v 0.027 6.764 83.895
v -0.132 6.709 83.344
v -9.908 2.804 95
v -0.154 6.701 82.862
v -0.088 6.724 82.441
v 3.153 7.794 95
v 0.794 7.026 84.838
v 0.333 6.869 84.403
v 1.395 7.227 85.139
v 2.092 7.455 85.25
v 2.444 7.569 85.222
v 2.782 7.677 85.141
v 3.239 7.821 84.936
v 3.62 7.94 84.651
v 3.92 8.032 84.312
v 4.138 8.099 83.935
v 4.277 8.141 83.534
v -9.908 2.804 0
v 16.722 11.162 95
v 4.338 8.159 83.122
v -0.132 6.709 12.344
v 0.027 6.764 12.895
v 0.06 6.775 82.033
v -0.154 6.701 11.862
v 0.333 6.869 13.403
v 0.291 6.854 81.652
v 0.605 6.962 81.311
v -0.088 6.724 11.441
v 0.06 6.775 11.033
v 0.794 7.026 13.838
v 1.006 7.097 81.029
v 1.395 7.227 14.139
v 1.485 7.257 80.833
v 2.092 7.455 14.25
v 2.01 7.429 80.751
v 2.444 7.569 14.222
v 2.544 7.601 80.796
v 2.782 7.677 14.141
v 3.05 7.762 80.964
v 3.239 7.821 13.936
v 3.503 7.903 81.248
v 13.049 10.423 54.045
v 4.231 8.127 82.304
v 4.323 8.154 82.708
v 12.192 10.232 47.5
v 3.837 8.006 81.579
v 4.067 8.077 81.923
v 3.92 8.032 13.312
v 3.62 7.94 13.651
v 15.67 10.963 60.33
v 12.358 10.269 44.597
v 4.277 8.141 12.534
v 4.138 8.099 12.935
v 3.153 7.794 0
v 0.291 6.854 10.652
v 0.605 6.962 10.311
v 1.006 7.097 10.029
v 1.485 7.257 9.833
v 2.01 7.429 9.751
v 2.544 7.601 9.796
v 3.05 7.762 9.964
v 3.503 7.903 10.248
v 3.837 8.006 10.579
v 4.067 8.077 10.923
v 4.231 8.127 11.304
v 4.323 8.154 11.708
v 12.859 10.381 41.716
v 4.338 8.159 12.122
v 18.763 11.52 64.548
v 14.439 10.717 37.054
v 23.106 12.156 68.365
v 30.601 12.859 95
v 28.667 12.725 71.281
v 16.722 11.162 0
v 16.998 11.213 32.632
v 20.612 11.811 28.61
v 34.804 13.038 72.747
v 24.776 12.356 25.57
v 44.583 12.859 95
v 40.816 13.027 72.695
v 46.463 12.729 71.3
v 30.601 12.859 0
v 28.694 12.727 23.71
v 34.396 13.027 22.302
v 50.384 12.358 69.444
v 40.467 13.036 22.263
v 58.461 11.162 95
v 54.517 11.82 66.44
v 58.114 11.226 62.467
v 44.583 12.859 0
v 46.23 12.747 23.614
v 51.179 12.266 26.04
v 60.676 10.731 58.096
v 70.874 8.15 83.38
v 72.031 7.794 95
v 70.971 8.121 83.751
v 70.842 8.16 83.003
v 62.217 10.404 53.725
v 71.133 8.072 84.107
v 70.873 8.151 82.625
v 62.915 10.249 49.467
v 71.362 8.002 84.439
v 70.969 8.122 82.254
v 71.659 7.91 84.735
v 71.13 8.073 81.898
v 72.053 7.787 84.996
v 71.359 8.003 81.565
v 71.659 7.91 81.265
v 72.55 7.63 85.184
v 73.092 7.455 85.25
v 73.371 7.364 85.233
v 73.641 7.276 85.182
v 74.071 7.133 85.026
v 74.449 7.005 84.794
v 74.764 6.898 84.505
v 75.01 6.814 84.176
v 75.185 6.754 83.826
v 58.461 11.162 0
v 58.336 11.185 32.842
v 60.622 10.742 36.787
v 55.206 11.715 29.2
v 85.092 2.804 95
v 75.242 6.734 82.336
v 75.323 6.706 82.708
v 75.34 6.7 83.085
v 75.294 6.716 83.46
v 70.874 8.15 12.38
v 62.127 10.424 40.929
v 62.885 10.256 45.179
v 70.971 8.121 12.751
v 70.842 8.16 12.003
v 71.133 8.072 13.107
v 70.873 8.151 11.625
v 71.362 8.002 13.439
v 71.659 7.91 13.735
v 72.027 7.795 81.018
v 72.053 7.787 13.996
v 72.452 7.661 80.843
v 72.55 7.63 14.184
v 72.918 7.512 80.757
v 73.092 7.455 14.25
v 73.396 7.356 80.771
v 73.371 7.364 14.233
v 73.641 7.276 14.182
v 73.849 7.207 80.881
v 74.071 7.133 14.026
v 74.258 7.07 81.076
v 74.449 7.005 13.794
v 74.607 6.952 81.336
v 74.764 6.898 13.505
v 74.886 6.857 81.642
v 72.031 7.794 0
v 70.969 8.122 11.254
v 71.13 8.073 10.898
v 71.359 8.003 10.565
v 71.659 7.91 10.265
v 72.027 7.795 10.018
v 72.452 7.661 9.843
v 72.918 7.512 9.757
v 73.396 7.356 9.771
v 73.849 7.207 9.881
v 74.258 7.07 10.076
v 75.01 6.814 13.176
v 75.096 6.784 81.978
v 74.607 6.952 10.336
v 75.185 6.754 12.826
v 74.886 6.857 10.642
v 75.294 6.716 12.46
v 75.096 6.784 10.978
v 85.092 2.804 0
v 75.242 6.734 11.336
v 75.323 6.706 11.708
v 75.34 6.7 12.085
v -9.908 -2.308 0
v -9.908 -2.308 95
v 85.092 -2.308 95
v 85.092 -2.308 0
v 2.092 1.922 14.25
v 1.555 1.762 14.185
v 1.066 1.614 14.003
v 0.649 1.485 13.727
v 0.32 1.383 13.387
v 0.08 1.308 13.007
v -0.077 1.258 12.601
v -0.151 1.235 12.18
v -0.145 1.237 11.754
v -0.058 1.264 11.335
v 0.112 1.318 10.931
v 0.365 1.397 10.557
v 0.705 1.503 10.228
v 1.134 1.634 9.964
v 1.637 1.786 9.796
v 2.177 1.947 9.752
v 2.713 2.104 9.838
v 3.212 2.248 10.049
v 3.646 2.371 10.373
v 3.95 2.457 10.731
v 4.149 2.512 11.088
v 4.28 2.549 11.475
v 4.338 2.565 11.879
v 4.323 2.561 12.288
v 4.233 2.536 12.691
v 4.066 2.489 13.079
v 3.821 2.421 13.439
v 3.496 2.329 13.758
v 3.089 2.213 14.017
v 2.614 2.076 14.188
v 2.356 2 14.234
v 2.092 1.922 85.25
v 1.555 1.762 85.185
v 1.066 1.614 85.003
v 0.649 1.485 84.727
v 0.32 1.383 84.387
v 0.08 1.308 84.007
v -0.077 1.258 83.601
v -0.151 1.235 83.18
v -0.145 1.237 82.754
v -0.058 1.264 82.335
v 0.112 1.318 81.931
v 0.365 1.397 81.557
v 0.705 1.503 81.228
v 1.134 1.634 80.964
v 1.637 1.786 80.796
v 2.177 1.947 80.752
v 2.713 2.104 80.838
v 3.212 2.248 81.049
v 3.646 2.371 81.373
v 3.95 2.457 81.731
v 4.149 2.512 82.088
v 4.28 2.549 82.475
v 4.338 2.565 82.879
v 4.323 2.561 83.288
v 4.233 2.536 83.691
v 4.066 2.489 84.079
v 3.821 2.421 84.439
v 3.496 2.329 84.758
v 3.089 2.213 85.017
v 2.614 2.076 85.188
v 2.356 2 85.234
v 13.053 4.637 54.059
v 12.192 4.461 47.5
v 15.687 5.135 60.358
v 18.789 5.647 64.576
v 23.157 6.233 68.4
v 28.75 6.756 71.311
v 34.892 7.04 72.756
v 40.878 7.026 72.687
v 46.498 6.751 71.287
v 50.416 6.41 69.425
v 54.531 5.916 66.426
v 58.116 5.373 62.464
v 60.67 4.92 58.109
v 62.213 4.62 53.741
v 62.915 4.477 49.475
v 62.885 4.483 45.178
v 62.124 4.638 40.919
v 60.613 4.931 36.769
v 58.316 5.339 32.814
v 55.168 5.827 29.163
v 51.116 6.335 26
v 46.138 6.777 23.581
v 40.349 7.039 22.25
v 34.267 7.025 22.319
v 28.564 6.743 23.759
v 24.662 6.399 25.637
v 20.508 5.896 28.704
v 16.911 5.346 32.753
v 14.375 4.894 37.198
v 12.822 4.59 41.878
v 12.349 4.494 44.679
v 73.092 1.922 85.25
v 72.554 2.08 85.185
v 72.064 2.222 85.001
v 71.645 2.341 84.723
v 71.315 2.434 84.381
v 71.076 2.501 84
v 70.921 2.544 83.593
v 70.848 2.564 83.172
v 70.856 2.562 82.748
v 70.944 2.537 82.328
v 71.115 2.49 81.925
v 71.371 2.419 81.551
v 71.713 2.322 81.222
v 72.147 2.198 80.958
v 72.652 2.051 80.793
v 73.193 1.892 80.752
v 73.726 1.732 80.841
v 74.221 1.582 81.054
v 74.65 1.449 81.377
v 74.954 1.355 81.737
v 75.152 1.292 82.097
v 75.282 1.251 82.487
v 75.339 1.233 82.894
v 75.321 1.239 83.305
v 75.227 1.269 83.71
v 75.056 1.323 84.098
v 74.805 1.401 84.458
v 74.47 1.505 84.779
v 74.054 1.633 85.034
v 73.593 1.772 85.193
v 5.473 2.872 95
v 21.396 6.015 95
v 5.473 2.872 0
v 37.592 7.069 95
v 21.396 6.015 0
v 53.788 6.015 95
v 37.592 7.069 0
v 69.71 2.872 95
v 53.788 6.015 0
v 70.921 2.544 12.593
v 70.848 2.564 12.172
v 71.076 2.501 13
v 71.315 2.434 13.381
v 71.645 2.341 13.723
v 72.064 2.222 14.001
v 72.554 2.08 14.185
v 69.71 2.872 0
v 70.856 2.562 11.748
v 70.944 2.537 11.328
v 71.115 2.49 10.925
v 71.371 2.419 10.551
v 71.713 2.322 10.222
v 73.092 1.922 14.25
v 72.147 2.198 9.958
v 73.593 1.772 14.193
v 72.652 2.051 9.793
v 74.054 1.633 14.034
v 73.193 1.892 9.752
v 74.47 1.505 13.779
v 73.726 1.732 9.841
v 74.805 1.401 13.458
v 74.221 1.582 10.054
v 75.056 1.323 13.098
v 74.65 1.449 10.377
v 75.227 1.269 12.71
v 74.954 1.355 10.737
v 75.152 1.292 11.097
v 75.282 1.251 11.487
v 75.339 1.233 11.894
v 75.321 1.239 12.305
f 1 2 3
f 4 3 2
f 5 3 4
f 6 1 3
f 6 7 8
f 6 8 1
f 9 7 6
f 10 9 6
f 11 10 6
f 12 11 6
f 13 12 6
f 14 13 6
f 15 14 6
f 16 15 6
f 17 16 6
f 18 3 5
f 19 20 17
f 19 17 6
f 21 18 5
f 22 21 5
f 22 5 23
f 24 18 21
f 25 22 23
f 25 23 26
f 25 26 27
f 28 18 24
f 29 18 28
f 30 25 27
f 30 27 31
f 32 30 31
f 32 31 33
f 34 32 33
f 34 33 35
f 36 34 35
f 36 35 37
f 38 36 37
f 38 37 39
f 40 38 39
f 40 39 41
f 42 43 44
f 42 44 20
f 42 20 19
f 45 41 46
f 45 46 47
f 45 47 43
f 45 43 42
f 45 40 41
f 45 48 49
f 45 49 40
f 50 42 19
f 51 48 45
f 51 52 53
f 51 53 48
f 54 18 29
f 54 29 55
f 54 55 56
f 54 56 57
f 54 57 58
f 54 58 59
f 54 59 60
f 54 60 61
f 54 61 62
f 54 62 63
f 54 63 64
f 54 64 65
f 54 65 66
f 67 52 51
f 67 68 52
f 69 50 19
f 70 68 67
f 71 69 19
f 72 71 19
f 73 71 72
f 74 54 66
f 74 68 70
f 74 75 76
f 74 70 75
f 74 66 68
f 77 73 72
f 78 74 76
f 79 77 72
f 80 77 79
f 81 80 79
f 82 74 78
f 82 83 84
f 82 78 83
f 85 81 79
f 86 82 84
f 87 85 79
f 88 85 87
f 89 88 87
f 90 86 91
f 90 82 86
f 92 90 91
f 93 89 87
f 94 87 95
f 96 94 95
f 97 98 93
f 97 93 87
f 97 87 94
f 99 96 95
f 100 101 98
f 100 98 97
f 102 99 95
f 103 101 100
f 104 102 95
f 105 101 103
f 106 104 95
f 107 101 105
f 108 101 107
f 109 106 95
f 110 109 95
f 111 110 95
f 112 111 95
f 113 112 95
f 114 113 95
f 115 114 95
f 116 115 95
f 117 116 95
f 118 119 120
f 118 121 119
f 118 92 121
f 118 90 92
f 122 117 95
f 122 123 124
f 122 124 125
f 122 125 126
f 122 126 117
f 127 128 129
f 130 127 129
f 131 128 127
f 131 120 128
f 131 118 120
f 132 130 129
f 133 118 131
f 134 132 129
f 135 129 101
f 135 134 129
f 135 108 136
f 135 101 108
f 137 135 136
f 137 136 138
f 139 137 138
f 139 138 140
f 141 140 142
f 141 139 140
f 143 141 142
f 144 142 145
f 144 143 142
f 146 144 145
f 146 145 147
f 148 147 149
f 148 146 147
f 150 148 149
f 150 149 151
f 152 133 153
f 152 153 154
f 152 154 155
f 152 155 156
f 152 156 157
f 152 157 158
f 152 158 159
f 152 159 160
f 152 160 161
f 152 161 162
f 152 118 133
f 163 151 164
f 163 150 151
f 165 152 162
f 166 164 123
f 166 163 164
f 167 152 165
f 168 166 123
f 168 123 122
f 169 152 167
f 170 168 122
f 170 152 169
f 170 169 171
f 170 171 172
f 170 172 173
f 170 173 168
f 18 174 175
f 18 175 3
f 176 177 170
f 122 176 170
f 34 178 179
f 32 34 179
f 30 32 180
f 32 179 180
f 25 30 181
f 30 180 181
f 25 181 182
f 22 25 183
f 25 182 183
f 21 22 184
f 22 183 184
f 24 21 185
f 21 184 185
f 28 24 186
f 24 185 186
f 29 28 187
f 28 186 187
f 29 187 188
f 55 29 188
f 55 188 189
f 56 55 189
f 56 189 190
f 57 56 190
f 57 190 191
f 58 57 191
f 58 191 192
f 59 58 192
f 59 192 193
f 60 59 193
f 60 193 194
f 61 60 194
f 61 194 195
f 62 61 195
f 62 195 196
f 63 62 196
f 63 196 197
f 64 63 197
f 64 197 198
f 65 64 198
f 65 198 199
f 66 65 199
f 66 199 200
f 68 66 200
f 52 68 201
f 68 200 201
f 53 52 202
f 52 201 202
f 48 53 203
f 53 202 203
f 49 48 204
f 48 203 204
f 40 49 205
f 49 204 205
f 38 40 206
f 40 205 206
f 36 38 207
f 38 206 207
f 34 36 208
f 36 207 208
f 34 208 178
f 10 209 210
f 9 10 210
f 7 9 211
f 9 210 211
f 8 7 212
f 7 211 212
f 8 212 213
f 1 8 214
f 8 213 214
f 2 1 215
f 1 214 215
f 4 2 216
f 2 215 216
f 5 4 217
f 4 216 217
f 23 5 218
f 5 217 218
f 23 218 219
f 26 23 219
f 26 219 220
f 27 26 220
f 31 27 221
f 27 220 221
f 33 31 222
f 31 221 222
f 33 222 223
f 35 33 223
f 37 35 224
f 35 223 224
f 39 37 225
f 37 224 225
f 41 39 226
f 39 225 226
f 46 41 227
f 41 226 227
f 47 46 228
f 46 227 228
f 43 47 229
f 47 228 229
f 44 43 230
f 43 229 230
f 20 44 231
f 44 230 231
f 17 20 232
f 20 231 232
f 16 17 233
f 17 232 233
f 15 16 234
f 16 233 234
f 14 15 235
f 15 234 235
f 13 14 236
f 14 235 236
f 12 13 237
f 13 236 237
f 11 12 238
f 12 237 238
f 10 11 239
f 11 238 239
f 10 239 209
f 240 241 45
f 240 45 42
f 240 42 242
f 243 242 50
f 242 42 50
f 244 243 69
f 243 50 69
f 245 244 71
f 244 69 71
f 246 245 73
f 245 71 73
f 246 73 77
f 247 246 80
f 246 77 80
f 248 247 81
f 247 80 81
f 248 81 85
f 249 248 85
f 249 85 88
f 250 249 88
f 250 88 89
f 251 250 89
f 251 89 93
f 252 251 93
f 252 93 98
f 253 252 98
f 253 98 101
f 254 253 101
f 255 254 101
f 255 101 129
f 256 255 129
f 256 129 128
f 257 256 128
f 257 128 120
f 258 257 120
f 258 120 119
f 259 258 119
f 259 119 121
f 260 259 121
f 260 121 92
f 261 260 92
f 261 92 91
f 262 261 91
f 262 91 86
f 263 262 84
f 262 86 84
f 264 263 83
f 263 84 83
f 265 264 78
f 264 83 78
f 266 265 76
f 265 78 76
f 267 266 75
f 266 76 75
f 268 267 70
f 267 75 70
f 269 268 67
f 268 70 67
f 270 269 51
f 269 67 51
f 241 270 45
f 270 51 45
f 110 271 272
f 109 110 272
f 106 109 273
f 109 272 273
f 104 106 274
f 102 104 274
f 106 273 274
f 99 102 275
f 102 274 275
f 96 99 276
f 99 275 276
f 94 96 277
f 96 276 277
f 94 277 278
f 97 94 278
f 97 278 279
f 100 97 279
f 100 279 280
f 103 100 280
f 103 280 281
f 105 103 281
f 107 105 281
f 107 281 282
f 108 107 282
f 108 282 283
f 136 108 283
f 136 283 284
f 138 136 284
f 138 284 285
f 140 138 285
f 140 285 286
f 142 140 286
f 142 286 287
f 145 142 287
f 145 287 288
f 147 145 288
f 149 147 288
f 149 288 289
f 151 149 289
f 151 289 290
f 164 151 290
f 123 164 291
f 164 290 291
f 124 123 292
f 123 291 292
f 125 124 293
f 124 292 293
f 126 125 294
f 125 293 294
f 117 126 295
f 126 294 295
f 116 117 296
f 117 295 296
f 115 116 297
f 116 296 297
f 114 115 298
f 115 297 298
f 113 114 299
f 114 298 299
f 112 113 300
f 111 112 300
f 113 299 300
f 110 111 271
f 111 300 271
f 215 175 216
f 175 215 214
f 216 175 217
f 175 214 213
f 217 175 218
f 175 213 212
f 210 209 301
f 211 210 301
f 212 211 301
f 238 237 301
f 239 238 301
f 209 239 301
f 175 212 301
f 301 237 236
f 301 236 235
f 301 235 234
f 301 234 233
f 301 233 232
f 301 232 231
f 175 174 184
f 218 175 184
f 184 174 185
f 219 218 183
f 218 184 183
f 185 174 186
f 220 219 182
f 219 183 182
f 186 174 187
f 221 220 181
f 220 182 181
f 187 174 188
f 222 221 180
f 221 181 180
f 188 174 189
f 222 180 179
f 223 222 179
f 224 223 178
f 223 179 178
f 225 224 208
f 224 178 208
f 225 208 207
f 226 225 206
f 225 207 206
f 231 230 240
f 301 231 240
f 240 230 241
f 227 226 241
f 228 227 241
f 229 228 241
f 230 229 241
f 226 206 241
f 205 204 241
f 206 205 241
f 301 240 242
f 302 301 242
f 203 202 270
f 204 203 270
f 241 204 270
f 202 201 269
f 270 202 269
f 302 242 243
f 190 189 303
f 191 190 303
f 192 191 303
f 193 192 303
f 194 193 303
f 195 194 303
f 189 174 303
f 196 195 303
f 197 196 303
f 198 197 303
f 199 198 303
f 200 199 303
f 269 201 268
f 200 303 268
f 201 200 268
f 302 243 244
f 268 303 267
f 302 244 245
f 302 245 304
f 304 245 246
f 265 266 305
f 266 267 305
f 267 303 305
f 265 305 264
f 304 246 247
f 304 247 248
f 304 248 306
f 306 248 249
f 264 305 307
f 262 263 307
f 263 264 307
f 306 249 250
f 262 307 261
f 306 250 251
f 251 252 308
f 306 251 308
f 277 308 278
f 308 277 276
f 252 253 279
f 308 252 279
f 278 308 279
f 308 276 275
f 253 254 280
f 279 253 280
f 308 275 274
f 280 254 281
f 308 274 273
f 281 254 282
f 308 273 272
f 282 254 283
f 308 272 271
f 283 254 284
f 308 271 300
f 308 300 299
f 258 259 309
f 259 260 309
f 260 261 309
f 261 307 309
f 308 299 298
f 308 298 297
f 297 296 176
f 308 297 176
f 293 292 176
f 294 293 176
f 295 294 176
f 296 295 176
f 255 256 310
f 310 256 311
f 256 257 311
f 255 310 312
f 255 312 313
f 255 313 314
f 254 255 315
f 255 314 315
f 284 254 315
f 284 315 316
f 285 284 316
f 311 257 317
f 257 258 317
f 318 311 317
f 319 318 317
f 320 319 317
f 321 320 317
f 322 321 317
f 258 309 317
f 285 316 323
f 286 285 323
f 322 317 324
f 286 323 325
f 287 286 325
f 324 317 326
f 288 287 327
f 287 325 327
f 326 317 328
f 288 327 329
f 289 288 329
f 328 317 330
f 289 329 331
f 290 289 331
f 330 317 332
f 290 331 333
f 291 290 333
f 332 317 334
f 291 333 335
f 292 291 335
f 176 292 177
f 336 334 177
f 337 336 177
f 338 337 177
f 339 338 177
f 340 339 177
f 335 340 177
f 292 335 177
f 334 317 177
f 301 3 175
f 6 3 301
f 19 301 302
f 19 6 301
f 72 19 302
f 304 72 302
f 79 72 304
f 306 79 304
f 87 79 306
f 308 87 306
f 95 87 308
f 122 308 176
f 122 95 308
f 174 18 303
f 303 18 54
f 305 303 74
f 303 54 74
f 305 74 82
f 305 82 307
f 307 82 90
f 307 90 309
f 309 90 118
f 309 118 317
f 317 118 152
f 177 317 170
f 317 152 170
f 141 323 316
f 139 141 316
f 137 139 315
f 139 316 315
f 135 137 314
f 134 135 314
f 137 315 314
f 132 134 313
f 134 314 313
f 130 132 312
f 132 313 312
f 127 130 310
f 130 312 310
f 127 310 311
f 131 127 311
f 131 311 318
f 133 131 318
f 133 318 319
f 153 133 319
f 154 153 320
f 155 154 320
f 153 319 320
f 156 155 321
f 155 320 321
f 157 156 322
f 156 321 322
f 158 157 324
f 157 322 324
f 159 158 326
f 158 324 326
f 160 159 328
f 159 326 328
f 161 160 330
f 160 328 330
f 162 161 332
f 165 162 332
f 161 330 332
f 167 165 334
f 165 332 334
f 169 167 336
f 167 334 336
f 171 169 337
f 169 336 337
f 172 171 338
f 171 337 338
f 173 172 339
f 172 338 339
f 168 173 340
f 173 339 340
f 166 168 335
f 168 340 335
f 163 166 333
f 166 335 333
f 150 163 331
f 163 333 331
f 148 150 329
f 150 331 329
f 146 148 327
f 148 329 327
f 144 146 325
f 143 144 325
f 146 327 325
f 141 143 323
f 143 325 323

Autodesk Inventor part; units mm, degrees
ref_plane "YZ Plane" through (0, 0, 0) normal (1, 0, 0) x (0, 1, 0)
ref_plane "XY Plane" through (0, 0, 0) normal (0, 0, 1) x (1, 0, 0)
sketch "Sketch1" plane through (0, 0, 0) normal (0, 0, 1) x (1, 0, 0)
  arc A0 (85.0917, -2.3076) -> (-9.9083, -2.3076) centre (37.5917, -117.9309) ccw
  arc A1 (85.0917, 2.8037) -> (-9.9083, 2.8037) centre (37.5917, -101.9281) ccw
  line L0 (-9.9083, -2.3076) -> (-9.9083, 2.8037)
  line L1 (85.0917, -2.3076) -> (85.0917, 2.8037)
  point P0 (0, 0)
extrude "Extrusion1" add sketch "Sketch1" along normal blind 95
sketch "Sketch2" plane through (0, 0, 0) normal (0, 1, 0) x (-1, 0, 0)
  line L0 (12.4083, 0) -> (12.4083, 95) projected
  line L1 (-85.0917, 95) -> (9.9083, 95) projected
  line L2 (9.9083, 0) -> (-85.0917, 0) projected
  line L3 (-87.5917, 0) -> (-87.5917, 95) projected
  line L4 (9.9083, 0) -> (9.9083, 95) projected
  line L5 (-85.0917, 0) -> (-85.0917, 95) projected
  point P0 (0, 0)
  point P1 (-2.0917, 83)
  point P2 (-2.0917, 12)
  point P3 (-73.0917, 12)
  point P4 (-73.0917, 83)
  dimension "d14" = 12
  dimension "d30" = 12
  dimension "d31" = 12
  dimension "d32" = 12
  dimension "d33" = 12
  dimension "d34" = 12
  dimension "d35" = 12
  dimension "d37" = 12
ref_plane "Work Plane1" through (0, 15, 0) normal (0, 1, 0) x (-1, 0, 0)
sketch "Sketch3" plane through (0, 15, 0) normal (0, 1, 0) x (-1, 0, 0)
  point P0 (0, 0)
  point P1 (-2.0917, 12)
  point P2 (-2.0917, 83)
  point P3 (-73.0917, 83)
  point P4 (-73.0917, 12)
hole "Hole1" at (73.0917, 15, 83) at (2.0917, 15, 83) at (2.0917, 15, 12) at (73.0917, 15, 12) direction (0, -1, 0) diameter 4.5 depth 34.9875 tip angle 118 clearance for "Countersunk Flat Head Screw ISO 2009/7046" size "M4" standard "ISO"
sketch "Sketch4" plane through (0, 15, 0) normal (0, 1, 0) x (-1, 0, 0)
  line L0 (9.9083, 0) -> (-85.0917, 0) projected
  circle A0 centre (-37.5917, 47.5) radius 25.4
  line L1 (-85.0917, 0) -> (-85.0917, 95) projected
  point P0 (0, 0)
  dimension "d23" = 47.5
  dimension "d25" = 50.8
  dimension "d36" = 47.5
extrude "Extrusion2" cut sketch "Sketch4" against normal blind 24.2875
properties part number "dopasowywacz" material "ABS Plastic"
